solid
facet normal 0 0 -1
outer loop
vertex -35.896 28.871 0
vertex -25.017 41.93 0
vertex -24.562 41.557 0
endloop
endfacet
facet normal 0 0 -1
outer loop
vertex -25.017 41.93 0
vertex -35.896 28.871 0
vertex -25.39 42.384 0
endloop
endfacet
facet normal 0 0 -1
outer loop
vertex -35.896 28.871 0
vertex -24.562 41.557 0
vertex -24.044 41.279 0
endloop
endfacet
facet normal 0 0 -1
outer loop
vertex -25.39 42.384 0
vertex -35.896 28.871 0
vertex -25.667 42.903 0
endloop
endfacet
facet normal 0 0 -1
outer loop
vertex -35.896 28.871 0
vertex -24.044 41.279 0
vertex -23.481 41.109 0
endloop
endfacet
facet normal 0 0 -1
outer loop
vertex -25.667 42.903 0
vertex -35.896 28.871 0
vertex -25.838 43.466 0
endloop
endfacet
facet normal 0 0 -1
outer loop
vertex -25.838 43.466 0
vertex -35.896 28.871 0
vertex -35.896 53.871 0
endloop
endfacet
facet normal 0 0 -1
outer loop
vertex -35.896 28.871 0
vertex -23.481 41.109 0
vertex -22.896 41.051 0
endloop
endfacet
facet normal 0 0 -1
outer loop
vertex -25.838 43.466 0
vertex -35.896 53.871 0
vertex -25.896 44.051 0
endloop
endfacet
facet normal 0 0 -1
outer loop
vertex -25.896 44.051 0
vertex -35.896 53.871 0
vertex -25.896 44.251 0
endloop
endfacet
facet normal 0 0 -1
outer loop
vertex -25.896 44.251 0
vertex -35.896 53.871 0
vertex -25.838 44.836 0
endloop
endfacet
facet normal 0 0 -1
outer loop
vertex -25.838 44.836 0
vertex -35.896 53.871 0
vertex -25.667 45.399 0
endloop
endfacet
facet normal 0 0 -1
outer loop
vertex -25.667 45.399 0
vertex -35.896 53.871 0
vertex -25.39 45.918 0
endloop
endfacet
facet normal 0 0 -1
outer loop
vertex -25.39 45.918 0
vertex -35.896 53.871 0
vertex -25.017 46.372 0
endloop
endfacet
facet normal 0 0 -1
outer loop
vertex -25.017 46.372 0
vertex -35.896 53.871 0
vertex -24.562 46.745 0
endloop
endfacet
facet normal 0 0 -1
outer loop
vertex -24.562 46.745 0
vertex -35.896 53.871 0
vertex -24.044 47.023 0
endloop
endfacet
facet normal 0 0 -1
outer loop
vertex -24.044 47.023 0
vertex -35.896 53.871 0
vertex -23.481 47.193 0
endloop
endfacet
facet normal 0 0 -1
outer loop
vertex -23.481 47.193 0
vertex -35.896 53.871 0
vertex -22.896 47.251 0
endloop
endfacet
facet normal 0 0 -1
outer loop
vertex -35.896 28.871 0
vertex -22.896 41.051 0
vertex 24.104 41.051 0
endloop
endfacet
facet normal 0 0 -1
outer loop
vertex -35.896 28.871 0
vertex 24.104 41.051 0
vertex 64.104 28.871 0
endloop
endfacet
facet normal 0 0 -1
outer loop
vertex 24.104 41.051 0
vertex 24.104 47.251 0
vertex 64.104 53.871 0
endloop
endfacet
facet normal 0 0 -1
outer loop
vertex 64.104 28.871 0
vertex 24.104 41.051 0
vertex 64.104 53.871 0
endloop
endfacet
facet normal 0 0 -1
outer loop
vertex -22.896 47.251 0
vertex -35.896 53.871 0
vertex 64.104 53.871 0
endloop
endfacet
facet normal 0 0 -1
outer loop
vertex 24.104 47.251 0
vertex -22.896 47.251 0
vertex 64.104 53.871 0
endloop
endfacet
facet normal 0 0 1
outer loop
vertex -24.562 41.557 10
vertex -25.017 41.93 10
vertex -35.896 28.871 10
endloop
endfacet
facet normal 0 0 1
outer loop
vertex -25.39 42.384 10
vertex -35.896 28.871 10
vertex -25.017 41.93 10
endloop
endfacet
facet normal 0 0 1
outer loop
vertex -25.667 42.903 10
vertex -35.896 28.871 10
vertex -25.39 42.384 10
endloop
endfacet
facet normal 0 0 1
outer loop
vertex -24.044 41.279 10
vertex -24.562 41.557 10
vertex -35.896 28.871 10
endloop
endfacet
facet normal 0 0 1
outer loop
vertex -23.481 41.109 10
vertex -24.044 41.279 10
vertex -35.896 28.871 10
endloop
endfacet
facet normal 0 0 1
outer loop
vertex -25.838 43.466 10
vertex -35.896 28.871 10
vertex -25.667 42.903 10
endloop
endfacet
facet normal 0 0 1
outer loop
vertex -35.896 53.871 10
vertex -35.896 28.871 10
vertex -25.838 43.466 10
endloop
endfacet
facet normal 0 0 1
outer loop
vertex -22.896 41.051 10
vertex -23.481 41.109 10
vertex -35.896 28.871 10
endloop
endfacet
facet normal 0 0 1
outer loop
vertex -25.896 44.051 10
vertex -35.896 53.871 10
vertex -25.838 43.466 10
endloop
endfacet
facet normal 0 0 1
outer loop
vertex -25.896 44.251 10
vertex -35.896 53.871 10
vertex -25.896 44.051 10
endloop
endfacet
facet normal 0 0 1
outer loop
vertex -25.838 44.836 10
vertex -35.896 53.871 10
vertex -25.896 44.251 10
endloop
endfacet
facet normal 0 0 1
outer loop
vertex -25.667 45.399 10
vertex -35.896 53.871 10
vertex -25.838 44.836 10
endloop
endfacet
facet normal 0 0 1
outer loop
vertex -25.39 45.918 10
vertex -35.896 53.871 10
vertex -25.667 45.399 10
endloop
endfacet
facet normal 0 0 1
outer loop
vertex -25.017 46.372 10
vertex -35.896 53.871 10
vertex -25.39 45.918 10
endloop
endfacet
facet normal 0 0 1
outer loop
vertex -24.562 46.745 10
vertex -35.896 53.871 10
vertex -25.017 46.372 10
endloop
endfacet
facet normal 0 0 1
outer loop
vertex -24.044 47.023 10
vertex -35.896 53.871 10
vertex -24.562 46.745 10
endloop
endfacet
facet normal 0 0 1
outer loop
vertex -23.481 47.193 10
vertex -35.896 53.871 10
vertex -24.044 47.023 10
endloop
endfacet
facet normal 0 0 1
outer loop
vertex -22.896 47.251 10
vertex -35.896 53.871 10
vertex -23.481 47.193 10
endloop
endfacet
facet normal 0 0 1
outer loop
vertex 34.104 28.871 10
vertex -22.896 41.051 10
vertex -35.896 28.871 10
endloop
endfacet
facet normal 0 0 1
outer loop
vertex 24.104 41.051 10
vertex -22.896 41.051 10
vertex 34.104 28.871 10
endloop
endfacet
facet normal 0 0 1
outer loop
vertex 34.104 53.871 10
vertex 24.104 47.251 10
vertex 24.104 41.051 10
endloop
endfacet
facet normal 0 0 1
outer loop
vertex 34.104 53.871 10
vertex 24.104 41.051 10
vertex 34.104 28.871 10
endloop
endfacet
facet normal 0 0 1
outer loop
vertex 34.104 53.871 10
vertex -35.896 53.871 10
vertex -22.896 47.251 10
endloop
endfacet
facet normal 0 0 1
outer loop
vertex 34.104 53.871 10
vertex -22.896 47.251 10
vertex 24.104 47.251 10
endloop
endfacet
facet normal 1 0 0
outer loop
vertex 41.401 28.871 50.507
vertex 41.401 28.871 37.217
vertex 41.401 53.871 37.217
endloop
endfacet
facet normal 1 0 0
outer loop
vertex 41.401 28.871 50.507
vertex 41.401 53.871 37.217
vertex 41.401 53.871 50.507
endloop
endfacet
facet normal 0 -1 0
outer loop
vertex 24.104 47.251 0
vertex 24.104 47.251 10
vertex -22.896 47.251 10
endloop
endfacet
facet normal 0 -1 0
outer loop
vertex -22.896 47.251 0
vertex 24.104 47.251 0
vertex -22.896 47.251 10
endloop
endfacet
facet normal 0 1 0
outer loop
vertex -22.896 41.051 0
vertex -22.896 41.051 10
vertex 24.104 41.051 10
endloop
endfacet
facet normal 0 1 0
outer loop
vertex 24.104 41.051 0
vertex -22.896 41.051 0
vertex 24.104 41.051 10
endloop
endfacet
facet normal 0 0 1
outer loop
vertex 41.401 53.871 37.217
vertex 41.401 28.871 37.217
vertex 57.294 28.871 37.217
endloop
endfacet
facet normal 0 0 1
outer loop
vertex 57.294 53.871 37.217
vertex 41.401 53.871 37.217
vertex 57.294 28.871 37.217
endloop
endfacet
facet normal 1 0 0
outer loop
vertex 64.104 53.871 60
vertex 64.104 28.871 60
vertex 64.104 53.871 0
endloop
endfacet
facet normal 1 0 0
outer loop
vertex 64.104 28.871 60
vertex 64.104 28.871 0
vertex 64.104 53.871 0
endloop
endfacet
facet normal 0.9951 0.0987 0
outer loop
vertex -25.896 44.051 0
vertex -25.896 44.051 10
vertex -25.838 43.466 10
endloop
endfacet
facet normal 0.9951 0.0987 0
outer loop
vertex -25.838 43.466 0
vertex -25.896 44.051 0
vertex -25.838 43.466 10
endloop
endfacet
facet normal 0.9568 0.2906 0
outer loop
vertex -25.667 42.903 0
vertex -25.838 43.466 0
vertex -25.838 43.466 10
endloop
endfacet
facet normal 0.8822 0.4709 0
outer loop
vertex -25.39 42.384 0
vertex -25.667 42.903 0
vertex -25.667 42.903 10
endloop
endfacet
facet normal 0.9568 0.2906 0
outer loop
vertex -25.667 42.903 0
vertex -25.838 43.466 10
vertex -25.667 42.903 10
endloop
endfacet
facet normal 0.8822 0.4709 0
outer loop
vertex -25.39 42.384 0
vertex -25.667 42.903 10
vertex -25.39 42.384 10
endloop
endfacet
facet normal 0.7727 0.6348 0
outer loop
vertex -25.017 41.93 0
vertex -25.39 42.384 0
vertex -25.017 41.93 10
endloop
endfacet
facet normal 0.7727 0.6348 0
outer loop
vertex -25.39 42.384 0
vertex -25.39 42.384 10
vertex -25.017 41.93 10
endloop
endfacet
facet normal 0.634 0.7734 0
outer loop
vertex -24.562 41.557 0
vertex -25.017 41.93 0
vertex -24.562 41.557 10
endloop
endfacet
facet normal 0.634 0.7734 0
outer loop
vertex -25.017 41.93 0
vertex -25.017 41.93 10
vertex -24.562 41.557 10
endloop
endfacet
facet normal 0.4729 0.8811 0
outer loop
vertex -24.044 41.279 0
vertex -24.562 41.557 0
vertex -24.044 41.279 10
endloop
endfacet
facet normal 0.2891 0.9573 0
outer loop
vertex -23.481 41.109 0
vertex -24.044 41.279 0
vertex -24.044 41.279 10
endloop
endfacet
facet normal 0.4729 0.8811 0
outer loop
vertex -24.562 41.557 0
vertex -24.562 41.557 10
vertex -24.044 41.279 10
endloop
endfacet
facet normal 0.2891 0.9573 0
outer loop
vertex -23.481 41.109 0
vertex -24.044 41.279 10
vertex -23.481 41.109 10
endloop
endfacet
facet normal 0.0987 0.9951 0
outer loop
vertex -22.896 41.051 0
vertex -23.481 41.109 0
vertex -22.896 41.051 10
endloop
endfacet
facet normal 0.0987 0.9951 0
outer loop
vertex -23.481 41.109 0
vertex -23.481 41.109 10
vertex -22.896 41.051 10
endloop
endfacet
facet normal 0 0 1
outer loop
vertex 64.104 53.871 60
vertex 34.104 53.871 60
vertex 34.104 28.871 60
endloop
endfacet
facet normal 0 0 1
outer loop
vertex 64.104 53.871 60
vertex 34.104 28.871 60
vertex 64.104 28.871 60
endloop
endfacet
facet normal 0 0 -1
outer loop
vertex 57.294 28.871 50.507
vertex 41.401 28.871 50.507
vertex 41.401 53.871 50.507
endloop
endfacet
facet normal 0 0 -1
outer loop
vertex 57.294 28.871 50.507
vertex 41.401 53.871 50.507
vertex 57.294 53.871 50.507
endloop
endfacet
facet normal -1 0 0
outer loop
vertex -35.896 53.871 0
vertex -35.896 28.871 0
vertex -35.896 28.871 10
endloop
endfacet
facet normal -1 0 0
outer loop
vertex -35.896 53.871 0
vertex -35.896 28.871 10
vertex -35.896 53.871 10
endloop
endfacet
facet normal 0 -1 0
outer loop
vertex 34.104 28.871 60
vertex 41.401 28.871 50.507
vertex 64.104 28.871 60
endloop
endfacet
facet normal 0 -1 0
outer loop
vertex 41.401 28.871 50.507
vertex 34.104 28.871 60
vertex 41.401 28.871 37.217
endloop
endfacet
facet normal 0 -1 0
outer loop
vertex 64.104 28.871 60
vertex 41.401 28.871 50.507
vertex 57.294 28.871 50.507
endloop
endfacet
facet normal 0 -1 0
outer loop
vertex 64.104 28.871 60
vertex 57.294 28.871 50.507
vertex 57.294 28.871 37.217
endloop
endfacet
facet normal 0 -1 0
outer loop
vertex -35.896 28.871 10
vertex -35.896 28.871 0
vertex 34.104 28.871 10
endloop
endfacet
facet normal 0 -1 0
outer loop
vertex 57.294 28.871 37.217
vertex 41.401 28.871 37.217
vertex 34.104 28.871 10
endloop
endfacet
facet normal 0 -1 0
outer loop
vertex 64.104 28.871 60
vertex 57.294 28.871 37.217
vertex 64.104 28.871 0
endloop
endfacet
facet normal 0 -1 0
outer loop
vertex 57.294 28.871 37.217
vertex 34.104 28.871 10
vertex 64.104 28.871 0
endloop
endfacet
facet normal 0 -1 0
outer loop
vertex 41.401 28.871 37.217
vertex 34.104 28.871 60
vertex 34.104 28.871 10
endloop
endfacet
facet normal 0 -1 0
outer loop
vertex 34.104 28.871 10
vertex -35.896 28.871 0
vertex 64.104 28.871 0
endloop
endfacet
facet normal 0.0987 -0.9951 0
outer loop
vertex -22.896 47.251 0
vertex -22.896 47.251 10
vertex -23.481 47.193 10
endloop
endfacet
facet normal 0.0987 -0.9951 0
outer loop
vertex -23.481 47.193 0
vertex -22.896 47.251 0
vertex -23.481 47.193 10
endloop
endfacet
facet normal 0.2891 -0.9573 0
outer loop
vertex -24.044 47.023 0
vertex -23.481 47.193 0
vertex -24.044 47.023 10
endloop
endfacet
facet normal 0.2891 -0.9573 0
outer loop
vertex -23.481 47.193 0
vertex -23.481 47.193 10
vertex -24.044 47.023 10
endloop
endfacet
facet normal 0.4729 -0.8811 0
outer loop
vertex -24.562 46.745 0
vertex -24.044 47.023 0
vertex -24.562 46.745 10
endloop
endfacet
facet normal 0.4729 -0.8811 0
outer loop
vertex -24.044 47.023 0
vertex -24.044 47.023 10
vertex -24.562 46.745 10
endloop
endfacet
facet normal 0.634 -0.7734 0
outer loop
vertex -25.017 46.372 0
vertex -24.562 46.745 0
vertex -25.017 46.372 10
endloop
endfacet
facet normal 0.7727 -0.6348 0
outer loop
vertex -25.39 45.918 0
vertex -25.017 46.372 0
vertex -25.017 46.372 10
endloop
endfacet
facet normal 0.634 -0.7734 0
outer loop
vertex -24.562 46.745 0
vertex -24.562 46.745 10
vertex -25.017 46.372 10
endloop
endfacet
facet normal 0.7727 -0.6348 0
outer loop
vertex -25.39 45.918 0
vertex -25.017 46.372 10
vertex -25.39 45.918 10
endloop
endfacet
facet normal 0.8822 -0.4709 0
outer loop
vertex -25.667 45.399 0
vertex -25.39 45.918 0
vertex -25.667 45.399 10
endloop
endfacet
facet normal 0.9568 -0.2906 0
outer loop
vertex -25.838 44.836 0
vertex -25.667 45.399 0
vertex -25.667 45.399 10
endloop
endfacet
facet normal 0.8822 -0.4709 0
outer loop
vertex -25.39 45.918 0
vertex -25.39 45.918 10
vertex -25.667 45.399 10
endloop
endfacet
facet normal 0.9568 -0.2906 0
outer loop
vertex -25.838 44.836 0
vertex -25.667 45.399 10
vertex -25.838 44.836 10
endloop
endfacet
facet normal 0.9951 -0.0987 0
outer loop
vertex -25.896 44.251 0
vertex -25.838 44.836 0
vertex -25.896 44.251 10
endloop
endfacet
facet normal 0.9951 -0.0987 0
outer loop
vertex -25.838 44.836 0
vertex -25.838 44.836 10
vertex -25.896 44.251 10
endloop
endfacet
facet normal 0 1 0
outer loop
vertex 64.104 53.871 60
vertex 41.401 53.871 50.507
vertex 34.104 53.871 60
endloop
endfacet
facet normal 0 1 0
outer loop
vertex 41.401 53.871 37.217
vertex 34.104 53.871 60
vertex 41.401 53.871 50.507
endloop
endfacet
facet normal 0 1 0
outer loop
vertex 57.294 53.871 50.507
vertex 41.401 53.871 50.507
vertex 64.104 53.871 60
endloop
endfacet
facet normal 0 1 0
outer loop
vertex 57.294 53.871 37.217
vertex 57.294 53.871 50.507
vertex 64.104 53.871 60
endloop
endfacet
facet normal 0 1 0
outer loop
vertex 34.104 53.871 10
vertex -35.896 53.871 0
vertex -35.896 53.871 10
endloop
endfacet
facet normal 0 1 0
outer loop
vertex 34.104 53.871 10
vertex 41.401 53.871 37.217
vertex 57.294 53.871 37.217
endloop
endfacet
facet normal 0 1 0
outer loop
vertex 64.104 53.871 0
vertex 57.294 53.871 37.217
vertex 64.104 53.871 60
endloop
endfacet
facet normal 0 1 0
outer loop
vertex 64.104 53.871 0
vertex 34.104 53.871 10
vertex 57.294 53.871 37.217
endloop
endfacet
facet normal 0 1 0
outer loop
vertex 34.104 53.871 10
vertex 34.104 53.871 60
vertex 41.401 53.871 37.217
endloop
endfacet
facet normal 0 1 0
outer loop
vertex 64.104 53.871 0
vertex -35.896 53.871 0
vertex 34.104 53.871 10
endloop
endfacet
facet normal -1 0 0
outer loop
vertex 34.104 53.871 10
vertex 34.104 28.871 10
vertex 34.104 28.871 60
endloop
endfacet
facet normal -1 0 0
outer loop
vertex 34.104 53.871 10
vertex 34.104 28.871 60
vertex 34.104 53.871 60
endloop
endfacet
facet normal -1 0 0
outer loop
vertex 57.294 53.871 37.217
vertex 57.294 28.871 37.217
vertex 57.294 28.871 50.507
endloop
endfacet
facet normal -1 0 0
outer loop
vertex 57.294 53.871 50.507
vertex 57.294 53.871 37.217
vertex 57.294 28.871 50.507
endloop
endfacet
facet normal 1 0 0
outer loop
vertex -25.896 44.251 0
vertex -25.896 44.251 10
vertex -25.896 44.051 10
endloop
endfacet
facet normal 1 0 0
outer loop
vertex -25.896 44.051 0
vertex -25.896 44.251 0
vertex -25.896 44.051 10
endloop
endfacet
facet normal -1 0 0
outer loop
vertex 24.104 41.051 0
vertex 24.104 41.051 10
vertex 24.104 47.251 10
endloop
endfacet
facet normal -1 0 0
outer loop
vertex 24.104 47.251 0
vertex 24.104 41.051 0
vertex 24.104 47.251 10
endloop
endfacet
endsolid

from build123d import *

# Parameters (mm, degrees)
F0_W     = 100
F0_H     = 25
F1_DEPTH = 10
F2_W     = 30
F2_H     = 25
F3_DEPTH = 50
F4_W     = 15.893344
F4_H     = 13.28928
F5_DEPTH = 25.001
F7_DEPTH = 25


with BuildPart() as f1:
    # F0 (on Top) → F1 (new body)
    with BuildSketch(Plane.XY):
        with Locations((14.104442, 41.370601)):
            Rectangle(F0_W, F0_H)
    extrude(amount=F1_DEPTH)

    # F2 (on face) → F3 (join)
    with BuildSketch(Plane.XY.offset(10)):
        with Locations((49.104442, 41.370601)):
            Rectangle(F2_W, F2_H)
    extrude(amount=F3_DEPTH)

    # F4 (on face) → F5 (cut, through all)
    with BuildSketch(Plane.XZ.offset(-28.870601)):
        with Locations((49.347391, 43.861993)):
            Rectangle(F4_W, F4_H)
    extrude(amount=-F5_DEPTH, mode=Mode.SUBTRACT)

    # F6 (on face) → F7 (cut)
    with BuildSketch(Plane.XY.offset(10)):
        with BuildLine():
            Line((-22.895558, 41.051087), (24.104442, 41.051087))
            Line((24.104442, 41.051087), (24.104442, 47.251087))
            Line((24.104442, 47.251087), (-22.895558, 47.251087))
            ThreePointArc((-22.895558, 47.251087), (-25.016878, 46.372407), (-25.895558, 44.251087))
            Line((-25.895558, 44.251087), (-25.895558, 44.051087))
            ThreePointArc((-25.895558, 44.051087), (-25.016878, 41.929766), (-22.895558, 41.051087))
        make_face()
    extrude(amount=-F7_DEPTH, mode=Mode.SUBTRACT)


solid = f1.part
